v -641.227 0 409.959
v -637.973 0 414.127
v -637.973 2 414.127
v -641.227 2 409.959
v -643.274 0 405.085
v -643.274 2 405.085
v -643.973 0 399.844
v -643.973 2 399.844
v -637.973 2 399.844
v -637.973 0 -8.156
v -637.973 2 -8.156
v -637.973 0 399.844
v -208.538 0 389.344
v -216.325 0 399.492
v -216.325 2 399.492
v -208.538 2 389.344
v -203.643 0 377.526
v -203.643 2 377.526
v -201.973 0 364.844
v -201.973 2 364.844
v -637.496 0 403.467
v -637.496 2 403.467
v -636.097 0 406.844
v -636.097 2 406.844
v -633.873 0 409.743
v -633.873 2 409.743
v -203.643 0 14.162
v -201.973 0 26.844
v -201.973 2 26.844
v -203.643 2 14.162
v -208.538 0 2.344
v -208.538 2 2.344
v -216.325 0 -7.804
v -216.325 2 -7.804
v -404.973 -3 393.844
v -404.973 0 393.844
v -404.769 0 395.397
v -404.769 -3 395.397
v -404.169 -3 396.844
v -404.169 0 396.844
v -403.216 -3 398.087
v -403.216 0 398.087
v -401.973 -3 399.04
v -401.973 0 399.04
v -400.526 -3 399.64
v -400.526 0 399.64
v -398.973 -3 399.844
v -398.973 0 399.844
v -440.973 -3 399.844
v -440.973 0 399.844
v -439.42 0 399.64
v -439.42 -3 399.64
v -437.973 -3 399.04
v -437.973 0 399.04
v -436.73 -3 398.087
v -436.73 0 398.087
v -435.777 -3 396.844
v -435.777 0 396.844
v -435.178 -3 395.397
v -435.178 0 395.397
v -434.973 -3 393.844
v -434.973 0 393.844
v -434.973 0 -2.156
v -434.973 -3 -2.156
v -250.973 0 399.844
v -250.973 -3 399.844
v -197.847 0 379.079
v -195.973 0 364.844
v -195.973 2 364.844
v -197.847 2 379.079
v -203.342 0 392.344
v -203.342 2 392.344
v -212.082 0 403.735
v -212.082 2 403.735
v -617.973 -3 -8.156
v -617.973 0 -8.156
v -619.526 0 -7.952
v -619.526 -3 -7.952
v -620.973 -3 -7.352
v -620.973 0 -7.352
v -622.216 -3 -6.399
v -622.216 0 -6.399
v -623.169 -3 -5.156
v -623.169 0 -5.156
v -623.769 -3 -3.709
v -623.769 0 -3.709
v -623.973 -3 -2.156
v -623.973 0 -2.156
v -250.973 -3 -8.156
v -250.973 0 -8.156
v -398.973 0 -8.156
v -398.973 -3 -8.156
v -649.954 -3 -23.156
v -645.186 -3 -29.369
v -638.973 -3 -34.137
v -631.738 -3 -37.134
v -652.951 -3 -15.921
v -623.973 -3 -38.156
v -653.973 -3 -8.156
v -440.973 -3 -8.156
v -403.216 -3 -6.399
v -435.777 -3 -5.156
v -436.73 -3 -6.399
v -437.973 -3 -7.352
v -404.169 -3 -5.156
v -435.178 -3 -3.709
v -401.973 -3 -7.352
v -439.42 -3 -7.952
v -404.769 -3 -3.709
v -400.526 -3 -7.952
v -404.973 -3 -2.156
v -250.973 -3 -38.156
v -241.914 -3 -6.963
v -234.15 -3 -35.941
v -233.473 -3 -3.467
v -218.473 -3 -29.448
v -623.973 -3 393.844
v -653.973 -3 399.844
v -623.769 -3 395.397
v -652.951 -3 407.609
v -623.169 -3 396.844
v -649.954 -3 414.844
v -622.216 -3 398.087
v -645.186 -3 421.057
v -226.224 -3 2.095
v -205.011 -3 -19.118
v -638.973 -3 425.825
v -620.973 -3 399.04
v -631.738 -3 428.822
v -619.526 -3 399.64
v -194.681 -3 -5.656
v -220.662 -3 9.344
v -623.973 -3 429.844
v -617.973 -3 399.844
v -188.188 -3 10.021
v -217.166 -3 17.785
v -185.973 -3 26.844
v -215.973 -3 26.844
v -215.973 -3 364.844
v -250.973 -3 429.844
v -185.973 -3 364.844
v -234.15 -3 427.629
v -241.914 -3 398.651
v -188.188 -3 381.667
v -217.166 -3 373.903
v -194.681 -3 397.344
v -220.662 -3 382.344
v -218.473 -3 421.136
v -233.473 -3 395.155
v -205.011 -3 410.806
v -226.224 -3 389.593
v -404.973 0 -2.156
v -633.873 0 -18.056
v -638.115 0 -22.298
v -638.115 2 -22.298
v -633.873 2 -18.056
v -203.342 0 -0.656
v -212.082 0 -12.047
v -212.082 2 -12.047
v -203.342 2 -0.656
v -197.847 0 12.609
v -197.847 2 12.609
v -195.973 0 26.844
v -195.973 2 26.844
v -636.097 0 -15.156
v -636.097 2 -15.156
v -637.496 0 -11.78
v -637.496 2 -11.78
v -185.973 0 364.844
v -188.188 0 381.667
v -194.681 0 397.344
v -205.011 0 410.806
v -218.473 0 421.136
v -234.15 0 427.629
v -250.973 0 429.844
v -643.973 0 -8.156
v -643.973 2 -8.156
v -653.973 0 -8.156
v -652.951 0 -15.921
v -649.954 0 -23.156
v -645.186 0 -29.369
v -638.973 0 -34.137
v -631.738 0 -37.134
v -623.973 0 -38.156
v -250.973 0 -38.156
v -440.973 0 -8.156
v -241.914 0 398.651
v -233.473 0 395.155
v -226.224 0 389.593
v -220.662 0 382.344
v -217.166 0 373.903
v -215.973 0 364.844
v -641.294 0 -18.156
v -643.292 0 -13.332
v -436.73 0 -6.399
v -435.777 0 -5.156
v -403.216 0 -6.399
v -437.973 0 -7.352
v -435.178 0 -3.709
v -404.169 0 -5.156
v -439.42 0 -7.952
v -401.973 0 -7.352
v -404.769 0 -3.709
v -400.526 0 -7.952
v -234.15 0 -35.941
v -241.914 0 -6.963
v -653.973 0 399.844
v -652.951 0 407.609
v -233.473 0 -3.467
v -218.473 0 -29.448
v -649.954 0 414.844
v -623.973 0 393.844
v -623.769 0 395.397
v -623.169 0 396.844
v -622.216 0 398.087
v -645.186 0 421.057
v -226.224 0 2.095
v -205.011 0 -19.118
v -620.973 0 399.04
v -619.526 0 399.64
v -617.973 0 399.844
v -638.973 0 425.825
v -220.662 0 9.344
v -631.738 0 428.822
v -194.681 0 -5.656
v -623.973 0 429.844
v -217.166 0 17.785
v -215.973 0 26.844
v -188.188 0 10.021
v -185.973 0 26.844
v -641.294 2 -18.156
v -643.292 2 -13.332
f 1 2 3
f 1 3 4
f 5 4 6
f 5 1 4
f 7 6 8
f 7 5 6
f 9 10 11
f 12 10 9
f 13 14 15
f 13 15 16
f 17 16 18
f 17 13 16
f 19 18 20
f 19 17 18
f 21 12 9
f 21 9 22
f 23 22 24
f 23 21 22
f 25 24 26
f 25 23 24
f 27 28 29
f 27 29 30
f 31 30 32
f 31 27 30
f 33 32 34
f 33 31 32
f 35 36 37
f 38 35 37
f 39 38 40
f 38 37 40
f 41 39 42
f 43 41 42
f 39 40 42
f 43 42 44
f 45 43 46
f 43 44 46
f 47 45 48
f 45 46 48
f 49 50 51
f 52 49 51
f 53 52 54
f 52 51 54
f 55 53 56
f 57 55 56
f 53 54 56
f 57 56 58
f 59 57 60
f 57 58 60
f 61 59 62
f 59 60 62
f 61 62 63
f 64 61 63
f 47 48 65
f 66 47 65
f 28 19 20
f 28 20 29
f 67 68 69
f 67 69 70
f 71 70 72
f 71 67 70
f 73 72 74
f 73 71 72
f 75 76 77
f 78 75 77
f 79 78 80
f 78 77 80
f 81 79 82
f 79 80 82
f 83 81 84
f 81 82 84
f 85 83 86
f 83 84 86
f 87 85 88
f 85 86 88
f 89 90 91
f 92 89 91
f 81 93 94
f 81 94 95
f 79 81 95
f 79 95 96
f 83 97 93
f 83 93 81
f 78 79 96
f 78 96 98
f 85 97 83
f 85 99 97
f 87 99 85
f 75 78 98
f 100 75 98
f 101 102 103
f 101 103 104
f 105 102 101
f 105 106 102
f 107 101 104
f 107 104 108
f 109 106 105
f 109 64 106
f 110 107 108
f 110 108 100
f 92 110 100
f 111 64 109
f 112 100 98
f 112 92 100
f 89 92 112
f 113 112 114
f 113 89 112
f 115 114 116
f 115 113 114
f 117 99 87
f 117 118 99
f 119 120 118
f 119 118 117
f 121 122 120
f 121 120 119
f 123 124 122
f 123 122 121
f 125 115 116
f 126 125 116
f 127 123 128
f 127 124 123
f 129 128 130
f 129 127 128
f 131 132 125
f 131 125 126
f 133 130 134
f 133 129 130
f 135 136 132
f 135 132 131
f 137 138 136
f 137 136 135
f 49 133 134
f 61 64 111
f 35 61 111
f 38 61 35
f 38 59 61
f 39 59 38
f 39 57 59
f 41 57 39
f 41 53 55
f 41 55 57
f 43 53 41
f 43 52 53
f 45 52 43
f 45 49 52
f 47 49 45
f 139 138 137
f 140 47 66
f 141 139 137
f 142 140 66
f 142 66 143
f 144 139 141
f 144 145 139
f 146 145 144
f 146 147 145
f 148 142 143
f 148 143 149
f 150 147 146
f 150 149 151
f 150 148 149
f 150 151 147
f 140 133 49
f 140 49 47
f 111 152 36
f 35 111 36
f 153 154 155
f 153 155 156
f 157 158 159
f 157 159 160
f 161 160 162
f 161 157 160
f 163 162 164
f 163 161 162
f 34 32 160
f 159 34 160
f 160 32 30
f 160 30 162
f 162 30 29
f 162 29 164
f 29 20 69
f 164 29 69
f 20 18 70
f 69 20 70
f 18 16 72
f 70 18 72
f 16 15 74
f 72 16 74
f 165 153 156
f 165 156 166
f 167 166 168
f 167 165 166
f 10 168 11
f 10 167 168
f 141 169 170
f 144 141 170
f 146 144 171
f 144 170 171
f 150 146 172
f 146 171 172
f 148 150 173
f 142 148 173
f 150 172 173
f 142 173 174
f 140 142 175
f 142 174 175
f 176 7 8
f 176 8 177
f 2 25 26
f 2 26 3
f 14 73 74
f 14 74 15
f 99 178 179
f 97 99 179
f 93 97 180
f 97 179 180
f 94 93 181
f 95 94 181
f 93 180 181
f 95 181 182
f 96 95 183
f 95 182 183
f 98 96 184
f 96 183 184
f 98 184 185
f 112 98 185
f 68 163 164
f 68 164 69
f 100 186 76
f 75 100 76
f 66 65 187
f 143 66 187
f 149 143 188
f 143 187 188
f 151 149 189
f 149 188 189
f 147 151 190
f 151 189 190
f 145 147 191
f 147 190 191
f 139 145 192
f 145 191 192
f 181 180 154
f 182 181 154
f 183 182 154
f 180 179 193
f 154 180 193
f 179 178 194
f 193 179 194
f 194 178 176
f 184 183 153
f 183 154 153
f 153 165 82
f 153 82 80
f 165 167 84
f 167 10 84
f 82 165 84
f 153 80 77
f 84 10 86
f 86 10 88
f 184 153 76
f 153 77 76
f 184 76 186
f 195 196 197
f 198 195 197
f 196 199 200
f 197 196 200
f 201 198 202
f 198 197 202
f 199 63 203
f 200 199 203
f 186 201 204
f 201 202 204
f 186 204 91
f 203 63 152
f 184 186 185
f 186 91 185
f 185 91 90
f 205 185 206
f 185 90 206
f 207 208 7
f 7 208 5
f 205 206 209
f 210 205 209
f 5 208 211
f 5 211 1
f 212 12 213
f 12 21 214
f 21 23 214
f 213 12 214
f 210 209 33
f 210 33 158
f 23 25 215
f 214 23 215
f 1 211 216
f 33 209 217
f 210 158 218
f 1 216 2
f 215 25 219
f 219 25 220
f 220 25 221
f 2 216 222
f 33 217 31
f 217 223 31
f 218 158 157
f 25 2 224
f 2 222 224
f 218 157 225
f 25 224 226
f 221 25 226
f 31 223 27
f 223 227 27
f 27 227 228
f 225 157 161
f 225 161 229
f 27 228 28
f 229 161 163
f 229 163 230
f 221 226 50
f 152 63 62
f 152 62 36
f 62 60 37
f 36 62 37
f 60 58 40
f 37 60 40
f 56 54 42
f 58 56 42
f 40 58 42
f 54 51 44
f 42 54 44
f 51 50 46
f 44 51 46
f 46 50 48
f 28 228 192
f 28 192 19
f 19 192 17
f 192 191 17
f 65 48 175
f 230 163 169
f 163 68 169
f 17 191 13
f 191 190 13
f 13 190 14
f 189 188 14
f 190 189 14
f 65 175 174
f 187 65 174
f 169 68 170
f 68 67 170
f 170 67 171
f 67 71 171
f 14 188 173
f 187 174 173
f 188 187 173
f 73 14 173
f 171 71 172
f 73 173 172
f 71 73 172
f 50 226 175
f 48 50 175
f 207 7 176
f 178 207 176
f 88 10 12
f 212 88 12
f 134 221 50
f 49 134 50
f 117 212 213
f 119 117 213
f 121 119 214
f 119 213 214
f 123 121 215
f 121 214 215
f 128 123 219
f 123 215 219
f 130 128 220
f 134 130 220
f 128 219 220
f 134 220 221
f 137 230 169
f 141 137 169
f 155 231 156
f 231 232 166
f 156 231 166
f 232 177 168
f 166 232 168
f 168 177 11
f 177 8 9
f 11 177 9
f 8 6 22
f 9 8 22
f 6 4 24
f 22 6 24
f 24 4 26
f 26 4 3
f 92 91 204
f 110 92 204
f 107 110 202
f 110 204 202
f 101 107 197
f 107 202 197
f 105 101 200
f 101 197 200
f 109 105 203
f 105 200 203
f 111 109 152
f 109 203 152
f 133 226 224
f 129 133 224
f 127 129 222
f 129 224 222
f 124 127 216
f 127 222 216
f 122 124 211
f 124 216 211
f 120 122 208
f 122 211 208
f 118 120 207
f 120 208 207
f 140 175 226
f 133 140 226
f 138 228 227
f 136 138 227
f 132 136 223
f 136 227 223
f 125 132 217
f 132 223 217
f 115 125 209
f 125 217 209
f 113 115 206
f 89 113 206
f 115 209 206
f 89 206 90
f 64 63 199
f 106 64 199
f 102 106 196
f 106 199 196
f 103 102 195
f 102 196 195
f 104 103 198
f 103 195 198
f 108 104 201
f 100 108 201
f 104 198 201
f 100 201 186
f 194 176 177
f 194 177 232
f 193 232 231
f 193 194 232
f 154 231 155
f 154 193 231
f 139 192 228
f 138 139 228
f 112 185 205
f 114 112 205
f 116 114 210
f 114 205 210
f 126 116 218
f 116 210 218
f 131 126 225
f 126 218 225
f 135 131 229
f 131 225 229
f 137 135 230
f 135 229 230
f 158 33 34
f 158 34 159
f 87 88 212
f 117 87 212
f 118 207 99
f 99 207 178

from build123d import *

# Parameters (mm, degrees)
F1_DEPTH = 3
F2_DEPTH = 2


# Not quite as in the source:
# - a feature names something its author has since deleted; it is built from what else it names


with BuildPart() as f1:
    # F0 (on Front) → F1 (new body)
    with BuildSketch(Plane.XZ):
        with BuildLine():
            Line((-185.9730800638, 26.8439535797), (-185.9730800638, 364.8439535797))
            ThreePointArc((-185.9730800638, 364.8439535797), (-205.0111392867, 410.8058943568), (-250.9730800638, 429.8439535797))
            Line((-250.9730800638, 429.8439535797), (-623.9730800638, 429.8439535797))
            ThreePointArc((-623.9730800638, 429.8439535797), (-645.1862834994, 421.0571570153), (-653.9730800638, 399.8439535797))
            Line((-653.9730800638, 399.8439535797), (-653.9730800638, -8.1560464203))
            ThreePointArc((-653.9730800638, -8.1560464203), (-645.1862834994, -29.3692498559), (-623.9730800638, -38.1560464203))
            Line((-623.9730800638, -38.1560464203), (-250.9730800638, -38.1560464203))
            ThreePointArc((-250.9730800638, -38.1560464203), (-205.0111392867, -19.1179871975), (-185.9730800638, 26.8439535797))
        make_face()
        with BuildLine():
            ThreePointArc((-637.9730800638, 414.1268104367), (-631.5342592992, 418.3595839651), (-623.9730800638, 419.8439535797))
            Line((-623.9730800638, 419.8439535797), (-250.9730800638, 419.8439535797))
            ThreePointArc((-250.9730800638, 419.8439535797), (-229.9254912838, 415.6573278678), (-212.0822070986, 403.7348265449))
            ThreePointArc((-212.0822070986, 403.7348265449), (-200.1597057757, 385.8915423597), (-195.9730800638, 364.8439535797))
            Line((-195.9730800638, 364.8439535797), (-195.9730800638, 195.8439535797))
            Line((-195.9730800638, 195.8439535797), (-195.9730800638, 26.8439535797))
            ThreePointArc((-195.9730800638, 26.8439535797), (-200.1597057757, 5.7963647996), (-212.0822070986, -12.0469193856))
            ThreePointArc((-212.0822070986, -12.0469193856), (-229.9254912838, -23.9694207085), (-250.9730800638, -28.1560464203))
            Line((-250.9730800638, -28.1560464203), (-623.9730800638, -28.1560464203))
            ThreePointArc((-623.9730800638, -28.1560464203), (-631.6267487111, -26.6336370706), (-638.1152156876, -22.2981820441))
            ThreePointArc((-638.1152156876, -22.2981820441), (-642.4506707141, -15.8097150676), (-643.9730800638, -8.1560464203))
            Line((-643.9730800638, -8.1560464203), (-643.9730800638, 195.8439535797))
            Line((-643.9730800638, 195.8439535797), (-643.9730800638, 399.8439535797))
            ThreePointArc((-643.9730800638, 399.8439535797), (-642.4121689784, 407.5899202721), (-637.9730800638, 414.1268104367))
        make_face(mode=Mode.SUBTRACT)
        with BuildLine():
            ThreePointArc((-623.9730800638, 413.8439535797), (-629.330648117, 412.7782670348), (-633.8725750005, 409.7434485163))
            ThreePointArc((-633.8725750005, 409.7434485163), (-636.907393519, 405.2015216328), (-637.9730800638, 399.8439535797))
            Line((-637.9730800638, 399.8439535797), (-637.9730800638, 195.8439535797))
            Line((-637.9730800638, 195.8439535797), (-637.9730800638, -8.1560464203))
            ThreePointArc((-637.9730800638, -8.1560464203), (-636.907393519, -13.5136144734), (-633.8725750005, -18.0555413569))
            ThreePointArc((-633.8725750005, -18.0555413569), (-629.330648117, -21.0903598755), (-623.9730800638, -22.1560464203))
            Line((-623.9730800638, -22.1560464203), (-428.9730800638, -22.1560464203))
            ThreePointArc((-428.9730800638, -22.1560464203), (-424.7304393767, -20.3986871075), (-422.9730800638, -16.1560464203))
            Line((-422.9730800638, -16.1560464203), (-422.9730800638, 407.8439535797))
            ThreePointArc((-422.9730800638, 407.8439535797), (-424.7304393767, 412.0865942668), (-428.9730800638, 413.8439535797))
            Line((-428.9730800638, 413.8439535797), (-623.9730800638, 413.8439535797))
        make_face()
        with BuildLine():
            Line((-623.9730800638, -2.1560464203), (-623.9730800638, 393.8439535797))
            ThreePointArc((-623.9730800638, 393.8439535797), (-622.215720751, 398.0865942668), (-617.9730800638, 399.8439535797))
            Line((-617.9730800638, 399.8439535797), (-440.9730800638, 399.8439535797))
            ThreePointArc((-440.9730800638, 399.8439535797), (-436.7304393767, 398.0865942668), (-434.9730800638, 393.8439535797))
            Line((-434.9730800638, 393.8439535797), (-434.9730800638, -2.1560464203))
            ThreePointArc((-434.9730800638, -2.1560464203), (-436.7304393767, -6.3986871075), (-440.9730800638, -8.1560464203))
            Line((-440.9730800638, -8.1560464203), (-617.9730800638, -8.1560464203))
            ThreePointArc((-617.9730800638, -8.1560464203), (-622.215720751, -6.3986871075), (-623.9730800638, -2.1560464203))
        make_face(mode=Mode.SUBTRACT)
        with BuildLine():
            ThreePointArc((-201.9730800638, 364.8439535797), (-205.7029829708, 383.5954417656), (-216.3248477857, 399.4921858578))
            ThreePointArc((-216.3248477857, 399.4921858578), (-232.221591878, 410.1140506727), (-250.9730800638, 413.8439535797))
            Line((-250.9730800638, 413.8439535797), (-410.9730800638, 413.8439535797))
            ThreePointArc((-410.9730800638, 413.8439535797), (-415.215720751, 412.0865942668), (-416.9730800638, 407.8439535797))
            Line((-416.9730800638, 407.8439535797), (-416.9730800638, -16.1560464203))
            ThreePointArc((-416.9730800638, -16.1560464203), (-415.215720751, -20.3986871075), (-410.9730800638, -22.1560464203))
            Line((-410.9730800638, -22.1560464203), (-250.9730800638, -22.1560464203))
            ThreePointArc((-250.9730800638, -22.1560464203), (-232.221591878, -18.4261435134), (-216.3248477857, -7.8042786985))
            ThreePointArc((-216.3248477857, -7.8042786985), (-205.7029829708, 8.0924653938), (-201.9730800638, 26.8439535797))
            Line((-201.9730800638, 26.8439535797), (-201.9730800638, 195.8439535797))
            Line((-201.9730800638, 195.8439535797), (-201.9730800638, 364.8439535797))
        make_face()
        with BuildLine():
            ThreePointArc((-404.9730800638, 393.8439535797), (-403.215720751, 398.0865942668), (-398.9730800638, 399.8439535797))
            Line((-398.9730800638, 399.8439535797), (-250.9730800638, 399.8439535797))
            ThreePointArc((-250.9730800638, 399.8439535797), (-226.2243427223, 389.5926909212), (-215.9730800638, 364.8439535797))
            Line((-215.9730800638, 364.8439535797), (-215.9730800638, 26.8439535797))
            ThreePointArc((-215.9730800638, 26.8439535797), (-226.2243427223, 2.0952162381), (-250.9730800638, -8.1560464203))
            Line((-250.9730800638, -8.1560464203), (-398.9730800638, -8.1560464203))
            ThreePointArc((-398.9730800638, -8.1560464203), (-403.215720751, -6.3986871075), (-404.9730800638, -2.1560464203))
            Line((-404.9730800638, -2.1560464203), (-404.9730800638, 393.8439535797))
        make_face(mode=Mode.SUBTRACT)
        with BuildLine():
            Line((-250.9730800638, 419.8439535797), (-623.9730800638, 419.8439535797))
            ThreePointArc((-623.9730800638, 419.8439535797), (-631.5342592992, 418.3595839651), (-637.9730800638, 414.1268104367))
            Line((-637.9730800638, 414.1268104367), (-633.8725750005, 409.7434485163))
            ThreePointArc((-633.8725750005, 409.7434485163), (-629.330648117, 412.7782670348), (-623.9730800638, 413.8439535797))
            Line((-623.9730800638, 413.8439535797), (-428.9730800638, 413.8439535797))
            ThreePointArc((-428.9730800638, 413.8439535797), (-424.7304393767, 412.0865942668), (-422.9730800638, 407.8439535797))
            Line((-422.9730800638, 407.8439535797), (-422.9730800638, -16.1560464203))
            ThreePointArc((-422.9730800638, -16.1560464203), (-424.7304393767, -20.3986871075), (-428.9730800638, -22.1560464203))
            Line((-428.9730800638, -22.1560464203), (-623.9730800638, -22.1560464203))
            ThreePointArc((-623.9730800638, -22.1560464203), (-629.330648117, -21.0903598755), (-633.8725750005, -18.0555413569))
            Line((-633.8725750005, -18.0555413569), (-638.1152156876, -22.2981820441))
            ThreePointArc((-638.1152156876, -22.2981820441), (-631.6267487111, -26.6336370706), (-623.9730800638, -28.1560464203))
            Line((-623.9730800638, -28.1560464203), (-250.9730800638, -28.1560464203))
            ThreePointArc((-250.9730800638, -28.1560464203), (-229.9254912838, -23.9694207085), (-212.0822070986, -12.0469193856))
            Line((-212.0822070986, -12.0469193856), (-216.3248477857, -7.8042786985))
            ThreePointArc((-216.3248477857, -7.8042786985), (-232.221591878, -18.4261435134), (-250.9730800638, -22.1560464203))
            Line((-250.9730800638, -22.1560464203), (-410.9730800638, -22.1560464203))
            ThreePointArc((-410.9730800638, -22.1560464203), (-415.215720751, -20.3986871075), (-416.9730800638, -16.1560464203))
            Line((-416.9730800638, -16.1560464203), (-416.9730800638, 407.8439535797))
            ThreePointArc((-416.9730800638, 407.8439535797), (-415.215720751, 412.0865942668), (-410.9730800638, 413.8439535797))
            Line((-410.9730800638, 413.8439535797), (-250.9730800638, 413.8439535797))
            ThreePointArc((-250.9730800638, 413.8439535797), (-232.221591878, 410.1140506727), (-216.3248477857, 399.4921858578))
            Line((-216.3248477857, 399.4921858578), (-212.0822070986, 403.7348265449))
            ThreePointArc((-212.0822070986, 403.7348265449), (-229.9254912838, 415.6573278678), (-250.9730800638, 419.8439535797))
        make_face()
        with BuildLine():
            Line((-633.8725750005, 409.7434485163), (-637.9730800638, 414.1268104367))
            ThreePointArc((-637.9730800638, 414.1268104367), (-642.4121689784, 407.5899202721), (-643.9730800638, 399.8439535797))
            Line((-643.9730800638, 399.8439535797), (-643.9730800638, 195.8439535797))
            Line((-643.9730800638, 195.8439535797), (-637.9730800638, 195.8439535797))
            Line((-637.9730800638, 195.8439535797), (-637.9730800638, 399.8439535797))
            ThreePointArc((-637.9730800638, 399.8439535797), (-636.907393519, 405.2015216328), (-633.8725750005, 409.7434485163))
        make_face()
        with BuildLine():
            Line((-637.9730800638, 195.8439535797), (-643.9730800638, 195.8439535797))
            Line((-643.9730800638, 195.8439535797), (-643.9730800638, -8.1560464203))
            ThreePointArc((-643.9730800638, -8.1560464203), (-642.4506707141, -15.8097150676), (-638.1152156876, -22.2981820441))
            Line((-638.1152156876, -22.2981820441), (-633.8725750005, -18.0555413569))
            ThreePointArc((-633.8725750005, -18.0555413569), (-636.907393519, -13.5136144734), (-637.9730800638, -8.1560464203))
            Line((-637.9730800638, -8.1560464203), (-637.9730800638, 195.8439535797))
        make_face()
        with BuildLine():
            ThreePointArc((-195.9730800638, 364.8439535797), (-200.1597057757, 385.8915423597), (-212.0822070986, 403.7348265449))
            Line((-212.0822070986, 403.7348265449), (-216.3248477857, 399.4921858578))
            ThreePointArc((-216.3248477857, 399.4921858578), (-205.7029829708, 383.5954417656), (-201.9730800638, 364.8439535797))
            Line((-201.9730800638, 364.8439535797), (-201.9730800638, 195.8439535797))
            Line((-201.9730800638, 195.8439535797), (-195.9730800638, 195.8439535797))
            Line((-195.9730800638, 195.8439535797), (-195.9730800638, 364.8439535797))
        make_face()
        with BuildLine():
            Line((-195.9730800638, 26.8439535797), (-195.9730800638, 195.8439535797))
            Line((-195.9730800638, 195.8439535797), (-201.9730800638, 195.8439535797))
            Line((-201.9730800638, 195.8439535797), (-201.9730800638, 26.8439535797))
            ThreePointArc((-201.9730800638, 26.8439535797), (-205.7029829708, 8.0924653938), (-216.3248477857, -7.8042786985))
            Line((-216.3248477857, -7.8042786985), (-212.0822070986, -12.0469193856))
            ThreePointArc((-212.0822070986, -12.0469193856), (-200.1597057757, 5.7963647996), (-195.9730800638, 26.8439535797))
        make_face()
    extrude(amount=F1_DEPTH)

    # F0 (on Front) → F2 (join)
    with BuildSketch(Plane.XZ):
        with BuildLine():
            ThreePointArc((-195.9730800638, 364.8439535797), (-200.1597057757, 385.8915423597), (-212.0822070986, 403.7348265449))
            Line((-212.0822070986, 403.7348265449), (-216.3248477857, 399.4921858578))
            ThreePointArc((-216.3248477857, 399.4921858578), (-205.7029829708, 383.5954417656), (-201.9730800638, 364.8439535797))
            Line((-201.9730800638, 364.8439535797), (-201.9730800638, 195.8439535797))
            Line((-201.9730800638, 195.8439535797), (-195.9730800638, 195.8439535797))
            Line((-195.9730800638, 195.8439535797), (-195.9730800638, 364.8439535797))
        make_face()
        with BuildLine():
            Line((-195.9730800638, 26.8439535797), (-195.9730800638, 195.8439535797))
            Line((-195.9730800638, 195.8439535797), (-201.9730800638, 195.8439535797))
            Line((-201.9730800638, 195.8439535797), (-201.9730800638, 26.8439535797))
            ThreePointArc((-201.9730800638, 26.8439535797), (-205.7029829708, 8.0924653938), (-216.3248477857, -7.8042786985))
            Line((-216.3248477857, -7.8042786985), (-212.0822070986, -12.0469193856))
            ThreePointArc((-212.0822070986, -12.0469193856), (-200.1597057757, 5.7963647996), (-195.9730800638, 26.8439535797))
        make_face()
        with BuildLine():
            Line((-637.9730800638, 195.8439535797), (-643.9730800638, 195.8439535797))
            Line((-643.9730800638, 195.8439535797), (-643.9730800638, -8.1560464203))
            ThreePointArc((-643.9730800638, -8.1560464203), (-642.4506707141, -15.8097150676), (-638.1152156876, -22.2981820441))
            Line((-638.1152156876, -22.2981820441), (-633.8725750005, -18.0555413569))
            ThreePointArc((-633.8725750005, -18.0555413569), (-636.907393519, -13.5136144734), (-637.9730800638, -8.1560464203))
            Line((-637.9730800638, -8.1560464203), (-637.9730800638, 195.8439535797))
        make_face()
        with BuildLine():
            Line((-633.8725750005, 409.7434485163), (-637.9730800638, 414.1268104367))
            ThreePointArc((-637.9730800638, 414.1268104367), (-642.4121689784, 407.5899202721), (-643.9730800638, 399.8439535797))
            Line((-643.9730800638, 399.8439535797), (-643.9730800638, 195.8439535797))
            Line((-643.9730800638, 195.8439535797), (-637.9730800638, 195.8439535797))
            Line((-637.9730800638, 195.8439535797), (-637.9730800638, 399.8439535797))
            ThreePointArc((-637.9730800638, 399.8439535797), (-636.907393519, 405.2015216328), (-633.8725750005, 409.7434485163))
        make_face()
    extrude(amount=-F2_DEPTH)


solid = f1.part
